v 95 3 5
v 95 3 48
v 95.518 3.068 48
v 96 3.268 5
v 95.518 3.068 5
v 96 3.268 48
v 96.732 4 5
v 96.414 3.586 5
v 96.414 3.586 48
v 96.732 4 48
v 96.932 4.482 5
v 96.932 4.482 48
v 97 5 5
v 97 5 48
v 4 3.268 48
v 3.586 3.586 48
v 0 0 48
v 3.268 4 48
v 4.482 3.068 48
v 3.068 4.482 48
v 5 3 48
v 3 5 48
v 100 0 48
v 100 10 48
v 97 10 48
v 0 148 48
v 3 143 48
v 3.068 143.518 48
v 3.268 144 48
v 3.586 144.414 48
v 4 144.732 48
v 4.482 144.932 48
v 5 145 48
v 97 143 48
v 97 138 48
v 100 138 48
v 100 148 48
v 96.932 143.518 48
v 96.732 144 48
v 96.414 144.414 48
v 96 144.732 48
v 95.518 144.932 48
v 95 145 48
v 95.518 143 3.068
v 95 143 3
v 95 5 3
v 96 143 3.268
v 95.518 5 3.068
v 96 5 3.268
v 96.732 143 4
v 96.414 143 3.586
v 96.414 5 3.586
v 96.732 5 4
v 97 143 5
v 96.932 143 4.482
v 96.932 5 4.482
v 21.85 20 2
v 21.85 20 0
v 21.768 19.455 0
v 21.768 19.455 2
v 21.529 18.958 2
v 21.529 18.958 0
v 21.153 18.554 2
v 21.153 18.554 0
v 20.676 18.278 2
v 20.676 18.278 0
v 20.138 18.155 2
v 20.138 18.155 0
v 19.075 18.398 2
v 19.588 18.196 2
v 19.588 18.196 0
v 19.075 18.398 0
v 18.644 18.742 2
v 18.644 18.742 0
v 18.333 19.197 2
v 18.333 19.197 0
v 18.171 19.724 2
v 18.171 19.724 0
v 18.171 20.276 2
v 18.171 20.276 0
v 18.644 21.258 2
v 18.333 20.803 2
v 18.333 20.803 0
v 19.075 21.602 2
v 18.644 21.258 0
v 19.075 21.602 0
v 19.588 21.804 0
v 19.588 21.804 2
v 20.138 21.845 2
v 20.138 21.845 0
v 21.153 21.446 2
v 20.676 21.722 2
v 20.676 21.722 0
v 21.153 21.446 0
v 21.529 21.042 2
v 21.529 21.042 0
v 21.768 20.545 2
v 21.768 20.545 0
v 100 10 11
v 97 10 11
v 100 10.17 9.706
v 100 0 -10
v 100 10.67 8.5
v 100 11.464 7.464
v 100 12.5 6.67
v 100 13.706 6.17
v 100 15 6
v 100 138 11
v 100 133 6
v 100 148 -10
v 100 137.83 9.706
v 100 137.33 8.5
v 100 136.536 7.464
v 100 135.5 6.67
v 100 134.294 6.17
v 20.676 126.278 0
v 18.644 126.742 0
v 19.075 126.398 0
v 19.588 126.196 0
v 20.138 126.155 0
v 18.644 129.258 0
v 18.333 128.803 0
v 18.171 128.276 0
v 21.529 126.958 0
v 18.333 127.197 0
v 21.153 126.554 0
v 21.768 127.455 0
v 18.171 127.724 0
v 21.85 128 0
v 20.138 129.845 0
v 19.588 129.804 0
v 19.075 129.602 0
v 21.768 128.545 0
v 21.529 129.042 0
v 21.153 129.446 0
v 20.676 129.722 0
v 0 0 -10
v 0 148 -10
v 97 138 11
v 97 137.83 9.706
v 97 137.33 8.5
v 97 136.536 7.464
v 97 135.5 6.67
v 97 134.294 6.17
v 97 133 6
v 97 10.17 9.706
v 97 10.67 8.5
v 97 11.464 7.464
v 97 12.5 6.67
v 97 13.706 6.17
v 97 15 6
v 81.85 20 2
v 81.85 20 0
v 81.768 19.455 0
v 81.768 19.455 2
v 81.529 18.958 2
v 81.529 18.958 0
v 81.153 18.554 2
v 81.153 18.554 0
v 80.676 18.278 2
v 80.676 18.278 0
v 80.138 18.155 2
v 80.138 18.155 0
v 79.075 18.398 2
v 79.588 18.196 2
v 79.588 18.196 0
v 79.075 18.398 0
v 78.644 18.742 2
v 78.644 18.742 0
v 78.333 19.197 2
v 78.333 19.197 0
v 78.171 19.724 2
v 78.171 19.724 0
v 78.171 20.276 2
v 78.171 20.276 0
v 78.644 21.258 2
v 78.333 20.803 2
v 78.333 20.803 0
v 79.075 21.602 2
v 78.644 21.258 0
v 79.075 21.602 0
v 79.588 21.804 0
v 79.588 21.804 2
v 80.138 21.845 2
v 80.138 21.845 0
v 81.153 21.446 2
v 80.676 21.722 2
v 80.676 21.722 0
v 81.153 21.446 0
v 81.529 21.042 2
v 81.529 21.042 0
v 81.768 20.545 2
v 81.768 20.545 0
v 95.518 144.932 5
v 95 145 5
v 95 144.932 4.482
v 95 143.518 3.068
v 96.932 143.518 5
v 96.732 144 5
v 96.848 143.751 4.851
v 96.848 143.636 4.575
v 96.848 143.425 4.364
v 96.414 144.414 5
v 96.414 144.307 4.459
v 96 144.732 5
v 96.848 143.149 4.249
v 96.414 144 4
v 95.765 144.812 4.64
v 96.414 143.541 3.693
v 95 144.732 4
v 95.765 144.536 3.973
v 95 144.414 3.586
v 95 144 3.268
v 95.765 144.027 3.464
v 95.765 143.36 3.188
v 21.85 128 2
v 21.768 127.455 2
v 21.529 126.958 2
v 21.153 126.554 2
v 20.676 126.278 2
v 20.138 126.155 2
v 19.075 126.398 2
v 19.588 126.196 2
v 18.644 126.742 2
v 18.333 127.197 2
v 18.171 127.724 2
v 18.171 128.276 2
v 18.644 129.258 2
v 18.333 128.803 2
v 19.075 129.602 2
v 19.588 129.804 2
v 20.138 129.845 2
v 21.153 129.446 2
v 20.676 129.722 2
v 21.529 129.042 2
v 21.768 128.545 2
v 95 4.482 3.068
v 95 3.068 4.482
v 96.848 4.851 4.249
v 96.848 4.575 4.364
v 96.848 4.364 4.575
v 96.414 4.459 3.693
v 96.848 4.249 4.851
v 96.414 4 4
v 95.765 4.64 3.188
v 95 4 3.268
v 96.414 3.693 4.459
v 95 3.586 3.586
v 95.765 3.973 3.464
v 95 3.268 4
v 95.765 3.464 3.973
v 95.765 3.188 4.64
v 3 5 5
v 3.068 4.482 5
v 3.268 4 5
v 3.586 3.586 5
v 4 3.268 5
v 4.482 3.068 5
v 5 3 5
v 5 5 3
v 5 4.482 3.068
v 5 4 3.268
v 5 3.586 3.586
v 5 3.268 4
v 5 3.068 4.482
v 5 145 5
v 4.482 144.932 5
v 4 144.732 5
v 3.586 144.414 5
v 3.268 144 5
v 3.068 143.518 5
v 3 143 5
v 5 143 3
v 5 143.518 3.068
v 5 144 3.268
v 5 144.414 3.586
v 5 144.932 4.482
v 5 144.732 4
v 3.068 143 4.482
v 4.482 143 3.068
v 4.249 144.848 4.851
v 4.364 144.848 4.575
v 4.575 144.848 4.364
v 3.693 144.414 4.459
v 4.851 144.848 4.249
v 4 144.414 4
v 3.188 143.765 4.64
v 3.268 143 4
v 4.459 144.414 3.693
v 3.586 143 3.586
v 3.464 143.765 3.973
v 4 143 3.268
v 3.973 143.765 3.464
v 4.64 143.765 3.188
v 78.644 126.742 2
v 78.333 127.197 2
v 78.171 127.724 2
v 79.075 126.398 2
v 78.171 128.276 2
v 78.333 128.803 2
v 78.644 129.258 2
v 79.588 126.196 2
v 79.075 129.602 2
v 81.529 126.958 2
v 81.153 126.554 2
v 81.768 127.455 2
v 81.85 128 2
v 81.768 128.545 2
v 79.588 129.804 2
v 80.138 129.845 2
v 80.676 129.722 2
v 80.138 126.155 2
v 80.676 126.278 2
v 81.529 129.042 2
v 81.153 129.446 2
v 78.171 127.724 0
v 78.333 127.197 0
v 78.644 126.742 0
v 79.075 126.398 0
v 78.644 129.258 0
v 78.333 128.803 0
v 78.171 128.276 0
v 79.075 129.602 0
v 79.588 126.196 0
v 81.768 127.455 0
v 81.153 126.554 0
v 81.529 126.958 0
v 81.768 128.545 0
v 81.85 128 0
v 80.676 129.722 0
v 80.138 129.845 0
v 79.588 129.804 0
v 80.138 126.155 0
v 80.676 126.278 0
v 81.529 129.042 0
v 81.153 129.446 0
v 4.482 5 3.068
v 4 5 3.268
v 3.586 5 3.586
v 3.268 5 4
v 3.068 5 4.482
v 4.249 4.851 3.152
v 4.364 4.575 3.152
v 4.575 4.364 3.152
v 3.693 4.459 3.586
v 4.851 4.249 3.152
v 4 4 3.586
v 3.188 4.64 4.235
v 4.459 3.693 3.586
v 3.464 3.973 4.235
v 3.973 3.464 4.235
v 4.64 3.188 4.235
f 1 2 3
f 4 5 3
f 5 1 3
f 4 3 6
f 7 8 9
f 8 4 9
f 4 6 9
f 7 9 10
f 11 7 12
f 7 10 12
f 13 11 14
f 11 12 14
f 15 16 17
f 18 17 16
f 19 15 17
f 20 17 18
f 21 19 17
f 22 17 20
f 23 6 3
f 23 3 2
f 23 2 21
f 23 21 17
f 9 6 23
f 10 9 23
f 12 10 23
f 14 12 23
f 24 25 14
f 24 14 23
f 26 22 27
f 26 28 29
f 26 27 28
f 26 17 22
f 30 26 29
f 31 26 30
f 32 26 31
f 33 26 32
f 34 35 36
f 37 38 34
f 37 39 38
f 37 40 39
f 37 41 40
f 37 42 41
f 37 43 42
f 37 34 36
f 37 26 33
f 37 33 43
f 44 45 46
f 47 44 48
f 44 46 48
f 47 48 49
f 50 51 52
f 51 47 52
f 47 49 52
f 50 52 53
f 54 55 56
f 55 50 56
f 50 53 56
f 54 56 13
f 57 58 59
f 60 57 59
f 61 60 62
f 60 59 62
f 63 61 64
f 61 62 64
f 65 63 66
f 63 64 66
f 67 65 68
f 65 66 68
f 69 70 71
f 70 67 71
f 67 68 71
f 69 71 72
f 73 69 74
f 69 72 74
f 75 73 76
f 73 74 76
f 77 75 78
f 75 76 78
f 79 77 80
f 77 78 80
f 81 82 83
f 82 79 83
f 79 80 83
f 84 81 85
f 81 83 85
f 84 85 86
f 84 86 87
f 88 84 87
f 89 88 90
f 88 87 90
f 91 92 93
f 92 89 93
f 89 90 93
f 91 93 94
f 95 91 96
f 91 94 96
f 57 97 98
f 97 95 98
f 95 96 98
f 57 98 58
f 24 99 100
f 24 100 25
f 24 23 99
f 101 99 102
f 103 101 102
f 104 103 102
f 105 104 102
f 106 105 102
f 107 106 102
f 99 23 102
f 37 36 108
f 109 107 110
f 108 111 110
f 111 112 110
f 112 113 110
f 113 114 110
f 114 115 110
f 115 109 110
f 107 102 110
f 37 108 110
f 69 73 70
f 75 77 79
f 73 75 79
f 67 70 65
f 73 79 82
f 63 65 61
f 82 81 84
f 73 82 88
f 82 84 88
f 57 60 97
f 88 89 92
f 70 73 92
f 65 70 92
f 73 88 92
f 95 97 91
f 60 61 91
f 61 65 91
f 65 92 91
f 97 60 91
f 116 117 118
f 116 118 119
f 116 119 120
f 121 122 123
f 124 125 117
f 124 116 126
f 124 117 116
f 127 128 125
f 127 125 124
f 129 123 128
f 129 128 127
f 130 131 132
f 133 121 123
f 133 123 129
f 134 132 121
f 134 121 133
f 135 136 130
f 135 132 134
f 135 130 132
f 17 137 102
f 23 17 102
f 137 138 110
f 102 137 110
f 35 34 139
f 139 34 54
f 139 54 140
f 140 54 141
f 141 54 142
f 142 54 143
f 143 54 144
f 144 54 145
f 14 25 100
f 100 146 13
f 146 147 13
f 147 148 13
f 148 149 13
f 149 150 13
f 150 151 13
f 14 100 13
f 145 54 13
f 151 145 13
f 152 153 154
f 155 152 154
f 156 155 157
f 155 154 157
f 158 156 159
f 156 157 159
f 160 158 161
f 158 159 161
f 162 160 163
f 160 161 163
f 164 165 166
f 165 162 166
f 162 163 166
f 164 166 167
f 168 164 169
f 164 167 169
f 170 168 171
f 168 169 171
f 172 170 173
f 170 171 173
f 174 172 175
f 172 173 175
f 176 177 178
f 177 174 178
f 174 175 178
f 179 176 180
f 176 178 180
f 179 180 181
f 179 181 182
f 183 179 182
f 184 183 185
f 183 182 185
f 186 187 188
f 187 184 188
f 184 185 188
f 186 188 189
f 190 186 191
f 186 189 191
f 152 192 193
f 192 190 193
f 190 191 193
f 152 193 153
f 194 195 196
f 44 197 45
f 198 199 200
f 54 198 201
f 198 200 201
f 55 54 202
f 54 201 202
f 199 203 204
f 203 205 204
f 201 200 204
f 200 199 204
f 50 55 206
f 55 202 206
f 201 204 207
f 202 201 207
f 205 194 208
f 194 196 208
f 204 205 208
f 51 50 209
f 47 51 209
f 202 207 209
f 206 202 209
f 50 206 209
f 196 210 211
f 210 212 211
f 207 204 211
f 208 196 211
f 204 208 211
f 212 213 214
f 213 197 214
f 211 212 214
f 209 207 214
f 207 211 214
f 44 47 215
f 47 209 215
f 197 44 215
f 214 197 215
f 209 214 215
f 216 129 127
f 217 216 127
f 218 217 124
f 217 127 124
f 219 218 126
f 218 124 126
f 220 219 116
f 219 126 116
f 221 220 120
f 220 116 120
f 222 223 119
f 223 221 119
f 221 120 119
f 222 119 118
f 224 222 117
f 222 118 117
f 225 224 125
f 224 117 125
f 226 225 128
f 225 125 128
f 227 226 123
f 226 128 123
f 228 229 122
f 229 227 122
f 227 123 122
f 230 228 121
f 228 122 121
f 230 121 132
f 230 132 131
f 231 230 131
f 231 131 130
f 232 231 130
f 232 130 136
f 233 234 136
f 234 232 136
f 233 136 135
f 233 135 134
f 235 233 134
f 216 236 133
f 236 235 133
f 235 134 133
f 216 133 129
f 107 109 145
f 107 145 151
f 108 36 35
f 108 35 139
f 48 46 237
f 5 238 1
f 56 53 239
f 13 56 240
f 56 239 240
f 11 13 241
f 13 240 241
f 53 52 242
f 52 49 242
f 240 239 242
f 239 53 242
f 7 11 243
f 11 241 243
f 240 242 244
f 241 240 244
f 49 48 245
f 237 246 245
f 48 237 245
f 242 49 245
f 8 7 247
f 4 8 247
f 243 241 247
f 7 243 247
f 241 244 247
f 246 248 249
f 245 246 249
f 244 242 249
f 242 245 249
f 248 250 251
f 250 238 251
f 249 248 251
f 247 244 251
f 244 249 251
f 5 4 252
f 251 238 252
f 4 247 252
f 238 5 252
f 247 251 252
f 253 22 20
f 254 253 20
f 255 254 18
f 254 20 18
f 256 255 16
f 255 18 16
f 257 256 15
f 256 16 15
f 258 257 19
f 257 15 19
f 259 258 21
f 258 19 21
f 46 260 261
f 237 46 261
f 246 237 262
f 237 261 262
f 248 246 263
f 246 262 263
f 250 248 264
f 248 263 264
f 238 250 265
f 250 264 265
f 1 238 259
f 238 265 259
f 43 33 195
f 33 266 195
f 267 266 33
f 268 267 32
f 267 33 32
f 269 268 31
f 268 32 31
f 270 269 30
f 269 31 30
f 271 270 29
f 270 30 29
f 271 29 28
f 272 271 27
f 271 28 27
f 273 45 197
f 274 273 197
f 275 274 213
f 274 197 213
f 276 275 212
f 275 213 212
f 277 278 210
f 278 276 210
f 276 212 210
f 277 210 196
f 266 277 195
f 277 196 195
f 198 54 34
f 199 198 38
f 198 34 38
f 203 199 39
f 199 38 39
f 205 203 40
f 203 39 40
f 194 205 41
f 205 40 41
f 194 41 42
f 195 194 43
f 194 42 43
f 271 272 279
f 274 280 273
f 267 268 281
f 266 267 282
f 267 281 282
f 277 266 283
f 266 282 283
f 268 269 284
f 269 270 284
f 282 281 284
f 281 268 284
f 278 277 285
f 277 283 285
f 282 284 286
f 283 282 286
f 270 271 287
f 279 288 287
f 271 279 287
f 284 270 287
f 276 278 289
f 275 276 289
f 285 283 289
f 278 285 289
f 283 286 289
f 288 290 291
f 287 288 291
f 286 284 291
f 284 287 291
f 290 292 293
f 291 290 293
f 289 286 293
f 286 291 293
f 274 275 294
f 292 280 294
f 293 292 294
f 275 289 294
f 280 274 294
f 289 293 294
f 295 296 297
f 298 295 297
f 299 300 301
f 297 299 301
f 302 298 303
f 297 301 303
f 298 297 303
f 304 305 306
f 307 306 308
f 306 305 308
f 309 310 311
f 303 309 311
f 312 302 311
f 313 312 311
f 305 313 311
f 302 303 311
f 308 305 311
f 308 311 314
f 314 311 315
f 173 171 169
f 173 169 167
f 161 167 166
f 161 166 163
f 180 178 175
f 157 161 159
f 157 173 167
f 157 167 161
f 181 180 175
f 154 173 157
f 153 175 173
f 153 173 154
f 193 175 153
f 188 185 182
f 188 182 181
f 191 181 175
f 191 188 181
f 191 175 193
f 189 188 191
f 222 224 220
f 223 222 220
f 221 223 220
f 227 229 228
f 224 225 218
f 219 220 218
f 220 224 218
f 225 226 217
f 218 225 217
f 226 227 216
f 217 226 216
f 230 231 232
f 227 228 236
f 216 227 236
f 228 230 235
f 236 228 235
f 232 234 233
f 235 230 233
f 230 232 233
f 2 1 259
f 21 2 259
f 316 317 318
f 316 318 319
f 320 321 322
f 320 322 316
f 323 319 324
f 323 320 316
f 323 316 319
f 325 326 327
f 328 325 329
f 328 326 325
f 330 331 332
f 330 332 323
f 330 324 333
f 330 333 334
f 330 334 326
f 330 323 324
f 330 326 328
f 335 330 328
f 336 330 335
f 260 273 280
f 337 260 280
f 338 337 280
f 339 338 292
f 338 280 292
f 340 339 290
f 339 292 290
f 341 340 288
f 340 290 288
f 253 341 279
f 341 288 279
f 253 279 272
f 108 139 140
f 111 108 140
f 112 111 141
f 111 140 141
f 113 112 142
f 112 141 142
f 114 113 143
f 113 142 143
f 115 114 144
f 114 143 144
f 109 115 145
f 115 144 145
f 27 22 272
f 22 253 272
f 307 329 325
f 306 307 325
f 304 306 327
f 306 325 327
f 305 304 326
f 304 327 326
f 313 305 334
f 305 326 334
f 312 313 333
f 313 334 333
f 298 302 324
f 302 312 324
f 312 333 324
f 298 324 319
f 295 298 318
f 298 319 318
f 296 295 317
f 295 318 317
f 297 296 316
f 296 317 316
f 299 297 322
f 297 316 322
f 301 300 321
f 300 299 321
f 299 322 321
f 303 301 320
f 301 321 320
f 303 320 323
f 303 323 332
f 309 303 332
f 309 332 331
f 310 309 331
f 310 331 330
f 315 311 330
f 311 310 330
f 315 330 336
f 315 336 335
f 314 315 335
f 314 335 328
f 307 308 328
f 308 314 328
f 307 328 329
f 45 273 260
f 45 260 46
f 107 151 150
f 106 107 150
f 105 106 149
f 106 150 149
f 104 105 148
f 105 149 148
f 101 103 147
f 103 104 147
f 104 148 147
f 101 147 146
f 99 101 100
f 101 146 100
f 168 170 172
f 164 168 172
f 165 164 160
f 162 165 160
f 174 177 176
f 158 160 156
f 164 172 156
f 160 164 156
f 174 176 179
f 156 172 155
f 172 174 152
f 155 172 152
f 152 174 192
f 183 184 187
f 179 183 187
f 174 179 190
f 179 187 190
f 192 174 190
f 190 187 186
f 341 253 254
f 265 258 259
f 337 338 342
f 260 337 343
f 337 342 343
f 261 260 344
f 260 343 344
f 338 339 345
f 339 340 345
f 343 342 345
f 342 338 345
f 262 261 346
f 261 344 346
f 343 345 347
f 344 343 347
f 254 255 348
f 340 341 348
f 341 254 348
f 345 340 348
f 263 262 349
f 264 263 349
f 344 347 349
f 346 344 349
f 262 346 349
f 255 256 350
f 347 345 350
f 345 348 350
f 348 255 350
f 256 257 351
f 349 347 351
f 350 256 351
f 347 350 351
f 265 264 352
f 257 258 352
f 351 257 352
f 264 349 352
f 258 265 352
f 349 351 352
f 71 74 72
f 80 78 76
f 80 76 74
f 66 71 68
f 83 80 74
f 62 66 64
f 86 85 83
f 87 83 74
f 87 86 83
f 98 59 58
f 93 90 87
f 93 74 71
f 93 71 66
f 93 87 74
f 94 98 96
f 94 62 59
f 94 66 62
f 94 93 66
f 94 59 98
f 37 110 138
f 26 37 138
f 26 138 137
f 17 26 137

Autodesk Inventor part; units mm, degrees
ref_plane "XZ Plane" through (0, 0, 0) normal (0, 1, 0) x (-1, 0, 0)
sketch "Boceto1" plane through (0, 0, 0) normal (0, 0, 1) x (1, 0, 0)
  circle A0 centre (80, 128) radius 1.85
  circle A1 centre (20, 128) radius 1.85
  circle A2 centre (80, 20) radius 1.85
  circle A3 centre (20, 20) radius 1.85
  line L0 (0, 0) -> (100, 0)
  line L1 (0, 148) -> (0, 0)
  line L2 (97, 3) -> (3, 3)
  line L3 (3, 3) -> (3, 145)
  line L4 (97, 145) -> (97, 3)
  line L5 (100, 0) -> (100, 148)
  line L6 (3, 145) -> (97, 145)
  line L7 (100, 148) -> (0, 148)
  circle A4 centre (20, 128) radius 4
  circle A5 centre (80, 128) radius 4
  circle A6 centre (20, 20) radius 4
  circle A7 centre (80, 20) radius 4
  dimension "d0" = 8
  dimension "d1" = 8
  dimension "d2" = 8
  dimension "d3" = 8
  dimension "d30" = 3.7
  dimension "d31" = 3.7
  dimension "d32" = 3.7
  dimension "d33" = 3.7
extrude "base1" add sketch "Boceto1" against normal blind 10 contours A0 | A1 | A2 | A3 | L1 L7 L5 L0 | L2 L3 L6 L4 | A4 | A5 | A6 | A7
extrude "base2" add sketch "Boceto1" along normal blind 3 contours A0 | A1 | A2 | A3 | L2 L3 L6 L4 | A4 | A5 | A6 | A7
extrude "Extrusión3" add sketch "Boceto1" along normal blind 48 contours L1 L7 L5 L0
sketch "Boceto2" plane through (100, 0, -10) normal (1, 0, 0) x (0, 0, -1)
  line L0 (-16, 10) -> (-86, 10)
  line L1 (-86, 10) -> (-86, 138)
  line L2 (-86, 138) -> (-16, 138)
  line L3 (-16, 138) -> (-16, 10)
  point P0 (-3, 0)
  point P1 (-51, 74)
  dimension "d10" = 70
  dimension "d11" = 128
extrude "Extrusión4" cut sketch "Boceto2" against normal blind 48
sketch "Boceto3" plane through (0, 0, 0) normal (1, 0, 0) x (0, 1, 0)
  point P0 (0, 0)
fillet "Empalme2" radius 2 8 edges at (3, 3, 25.5) (50, 3, 3) (3, 74, 3) (3, 145, 25.5) (50, 145, 3) (97, 145, 25.5) (97, 74, 3) (97, 3, 25.5)
fillet "Empalme2" radius 5 2 edges at (98.5, 138, 6) (98.5, 10, 6)
ref_plane "Plano de trabajo1" through (120, 0, 0) normal (1, 0, 0) x (0, 1, 0)
sketch "Boceto4" plane through (120, 0, 0) normal (1, 0, 0) x (0, 1, 0)
  arc A0 (0, 2.8284) -> (0.5858, 1.4142) centre (2, 2.8284) ccw
  line L0 (0, 48) -> (0, 2.8284)
  line L1 (5, -3) -> (0.5858, 1.4142)
  line L2 (5, -3) -> (143, -3)
  line L3 (143, -3) -> (147.4142, 1.4142)
  line L4 (148, 2.8284) -> (148, 48)
  arc A1 (147.4142, 1.4142) -> (148, 2.8284) centre (146, 2.8284) ccw
  line L5 (146, 48) -> (148, 48)
  line L6 (143, 48) -> (146, 48)
  line L7 (5, 48) -> (143, 48)
  line L8 (2, 48) -> (5, 48)
  line L9 (0, 48) -> (2, 48)
  arc A2 (10, 43) -> (5, 48) centre (5, 43) ccw
  line L10 (10, 18) -> (10, 43)
  arc A3 (10, 18) -> (15, 13) centre (15, 18) ccw
  line L11 (133, 13) -> (15, 13)
  arc A4 (133, 13) -> (138, 18) centre (133, 18) ccw
  line L12 (138, 43) -> (138, 18)
  arc A5 (143, 48) -> (138, 43) centre (143, 43) ccw
  point P0 (0, 0)
sketch "Boceto5" plane through (0, 0, 0) normal (0, 1, 0) x (-1, 0, 0)
  arc A0 (0, 46.5) -> (-1.5, 48) centre (-1.5, 46.5) ccw
  line L0 (-2, 48) -> (-1.5, 48)
  line L1 (-2, 48) -> (-98, 48)
  line L2 (0, 46.5) -> (0, 2.8284)
  arc A1 (-98.5, 48) -> (-100, 46.5) centre (-98.5, 46.5) ccw
  line L3 (-98.5, 48) -> (-98, 48)
  line L4 (-100, 2.8284) -> (-100, 46.5)
  arc A2 (-100, 2.8284) -> (-99.4142, 1.4142) centre (-98, 2.8284) ccw
  line L5 (-95, -3) -> (-99.4142, 1.4142)
  line L6 (-5, -3) -> (-95, -3)
  arc A3 (-0.5858, 1.4142) -> (0, 2.8284) centre (-2, 2.8284) ccw
  line L7 (-5, -3) -> (-0.5858, 1.4142)
  point P0 (0, 0)
extrude "Extrusión5" cut sketch "Boceto1" along normal blind 2 contours A0 | A1 | A2 | A3
ref_plane "Plano de trabajo2" through (0, 0, -3) normal (0, 0, 1) x (1, 0, 0)
sketch "Boceto6" plane through (0, 0, -3) normal (0, 0, 1) x (1, 0, 0)
  circle A0 centre (20, 128) radius 2
  circle A1 centre (20, 128) radius 2.3
  circle A2 centre (20, 20) radius 0.35 projected
  circle A3 centre (20, 20) radius 2.3
  circle A4 centre (80, 20) radius 0.35 projected
  circle A5 centre (80, 20) radius 2.3
  circle A6 centre (80, 128) radius 0.35 projected
  circle A7 centre (80, 128) radius 2.3
  point P0 (0, 0)
  dimension "d29" = 4.6
  dimension "d34" = 4.6
  dimension "d35" = 4.6
  dimension "d36" = 4.6
extrude "Extrusión6" [suppressed]
properties part number "_3DPrint"
